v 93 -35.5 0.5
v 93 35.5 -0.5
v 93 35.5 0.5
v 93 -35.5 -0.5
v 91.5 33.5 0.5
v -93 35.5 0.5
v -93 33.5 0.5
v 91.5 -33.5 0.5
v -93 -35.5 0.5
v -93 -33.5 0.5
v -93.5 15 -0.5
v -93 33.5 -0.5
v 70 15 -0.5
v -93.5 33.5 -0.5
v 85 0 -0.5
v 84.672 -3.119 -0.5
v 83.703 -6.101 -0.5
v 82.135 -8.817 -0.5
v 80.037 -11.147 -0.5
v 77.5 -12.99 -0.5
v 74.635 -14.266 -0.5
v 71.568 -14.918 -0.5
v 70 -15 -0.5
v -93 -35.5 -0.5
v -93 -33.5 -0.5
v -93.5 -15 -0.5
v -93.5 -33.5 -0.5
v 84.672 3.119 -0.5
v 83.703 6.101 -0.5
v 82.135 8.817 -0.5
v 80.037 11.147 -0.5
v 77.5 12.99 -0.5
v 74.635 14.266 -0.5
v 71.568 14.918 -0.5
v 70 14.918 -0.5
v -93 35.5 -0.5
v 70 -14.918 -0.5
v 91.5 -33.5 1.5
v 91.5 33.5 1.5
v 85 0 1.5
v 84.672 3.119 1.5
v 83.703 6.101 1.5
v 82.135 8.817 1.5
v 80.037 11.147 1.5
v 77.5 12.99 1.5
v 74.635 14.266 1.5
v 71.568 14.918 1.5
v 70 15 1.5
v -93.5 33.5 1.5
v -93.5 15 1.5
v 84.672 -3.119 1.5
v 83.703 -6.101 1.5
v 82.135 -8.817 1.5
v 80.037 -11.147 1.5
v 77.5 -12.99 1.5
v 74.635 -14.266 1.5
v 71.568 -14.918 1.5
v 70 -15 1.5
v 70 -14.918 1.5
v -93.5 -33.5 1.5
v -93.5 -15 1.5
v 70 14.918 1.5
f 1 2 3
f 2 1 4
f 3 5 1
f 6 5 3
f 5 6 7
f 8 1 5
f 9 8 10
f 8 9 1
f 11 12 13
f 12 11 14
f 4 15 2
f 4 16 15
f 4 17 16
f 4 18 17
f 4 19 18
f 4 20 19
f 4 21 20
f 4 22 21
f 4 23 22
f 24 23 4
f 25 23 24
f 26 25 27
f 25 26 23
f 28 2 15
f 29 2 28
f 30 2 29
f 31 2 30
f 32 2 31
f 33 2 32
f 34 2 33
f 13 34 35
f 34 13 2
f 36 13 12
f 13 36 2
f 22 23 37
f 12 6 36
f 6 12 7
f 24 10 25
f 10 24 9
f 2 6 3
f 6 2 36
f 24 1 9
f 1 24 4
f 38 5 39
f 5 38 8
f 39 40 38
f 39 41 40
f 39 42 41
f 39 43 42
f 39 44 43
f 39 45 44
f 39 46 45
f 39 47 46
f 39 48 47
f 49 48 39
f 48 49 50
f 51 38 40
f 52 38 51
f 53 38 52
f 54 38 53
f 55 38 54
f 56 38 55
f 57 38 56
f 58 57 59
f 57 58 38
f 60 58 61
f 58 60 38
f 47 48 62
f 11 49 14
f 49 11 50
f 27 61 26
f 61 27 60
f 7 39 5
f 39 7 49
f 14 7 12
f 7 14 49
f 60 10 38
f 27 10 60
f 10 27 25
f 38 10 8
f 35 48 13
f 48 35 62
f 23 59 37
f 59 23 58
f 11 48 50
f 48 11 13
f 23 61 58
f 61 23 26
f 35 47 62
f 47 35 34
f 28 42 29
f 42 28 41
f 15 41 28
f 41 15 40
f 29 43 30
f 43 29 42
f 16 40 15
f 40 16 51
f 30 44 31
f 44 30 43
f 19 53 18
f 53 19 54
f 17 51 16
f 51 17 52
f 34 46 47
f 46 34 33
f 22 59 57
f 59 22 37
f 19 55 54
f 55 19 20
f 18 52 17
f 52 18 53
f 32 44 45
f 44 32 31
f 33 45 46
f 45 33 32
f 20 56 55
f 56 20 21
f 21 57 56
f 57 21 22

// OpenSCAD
difference(){
    union(){
        cube([186,71,1],center=true);
        translate([-1,0,0.5]){cube([185,67,2],center=true);}
    };
    union(){
        translate([-15,0,0.5]){cube([170,30,8],center=true);}
        translate([70,0,2]){cylinder(h=8,r=15,center=true);}
    };
}
